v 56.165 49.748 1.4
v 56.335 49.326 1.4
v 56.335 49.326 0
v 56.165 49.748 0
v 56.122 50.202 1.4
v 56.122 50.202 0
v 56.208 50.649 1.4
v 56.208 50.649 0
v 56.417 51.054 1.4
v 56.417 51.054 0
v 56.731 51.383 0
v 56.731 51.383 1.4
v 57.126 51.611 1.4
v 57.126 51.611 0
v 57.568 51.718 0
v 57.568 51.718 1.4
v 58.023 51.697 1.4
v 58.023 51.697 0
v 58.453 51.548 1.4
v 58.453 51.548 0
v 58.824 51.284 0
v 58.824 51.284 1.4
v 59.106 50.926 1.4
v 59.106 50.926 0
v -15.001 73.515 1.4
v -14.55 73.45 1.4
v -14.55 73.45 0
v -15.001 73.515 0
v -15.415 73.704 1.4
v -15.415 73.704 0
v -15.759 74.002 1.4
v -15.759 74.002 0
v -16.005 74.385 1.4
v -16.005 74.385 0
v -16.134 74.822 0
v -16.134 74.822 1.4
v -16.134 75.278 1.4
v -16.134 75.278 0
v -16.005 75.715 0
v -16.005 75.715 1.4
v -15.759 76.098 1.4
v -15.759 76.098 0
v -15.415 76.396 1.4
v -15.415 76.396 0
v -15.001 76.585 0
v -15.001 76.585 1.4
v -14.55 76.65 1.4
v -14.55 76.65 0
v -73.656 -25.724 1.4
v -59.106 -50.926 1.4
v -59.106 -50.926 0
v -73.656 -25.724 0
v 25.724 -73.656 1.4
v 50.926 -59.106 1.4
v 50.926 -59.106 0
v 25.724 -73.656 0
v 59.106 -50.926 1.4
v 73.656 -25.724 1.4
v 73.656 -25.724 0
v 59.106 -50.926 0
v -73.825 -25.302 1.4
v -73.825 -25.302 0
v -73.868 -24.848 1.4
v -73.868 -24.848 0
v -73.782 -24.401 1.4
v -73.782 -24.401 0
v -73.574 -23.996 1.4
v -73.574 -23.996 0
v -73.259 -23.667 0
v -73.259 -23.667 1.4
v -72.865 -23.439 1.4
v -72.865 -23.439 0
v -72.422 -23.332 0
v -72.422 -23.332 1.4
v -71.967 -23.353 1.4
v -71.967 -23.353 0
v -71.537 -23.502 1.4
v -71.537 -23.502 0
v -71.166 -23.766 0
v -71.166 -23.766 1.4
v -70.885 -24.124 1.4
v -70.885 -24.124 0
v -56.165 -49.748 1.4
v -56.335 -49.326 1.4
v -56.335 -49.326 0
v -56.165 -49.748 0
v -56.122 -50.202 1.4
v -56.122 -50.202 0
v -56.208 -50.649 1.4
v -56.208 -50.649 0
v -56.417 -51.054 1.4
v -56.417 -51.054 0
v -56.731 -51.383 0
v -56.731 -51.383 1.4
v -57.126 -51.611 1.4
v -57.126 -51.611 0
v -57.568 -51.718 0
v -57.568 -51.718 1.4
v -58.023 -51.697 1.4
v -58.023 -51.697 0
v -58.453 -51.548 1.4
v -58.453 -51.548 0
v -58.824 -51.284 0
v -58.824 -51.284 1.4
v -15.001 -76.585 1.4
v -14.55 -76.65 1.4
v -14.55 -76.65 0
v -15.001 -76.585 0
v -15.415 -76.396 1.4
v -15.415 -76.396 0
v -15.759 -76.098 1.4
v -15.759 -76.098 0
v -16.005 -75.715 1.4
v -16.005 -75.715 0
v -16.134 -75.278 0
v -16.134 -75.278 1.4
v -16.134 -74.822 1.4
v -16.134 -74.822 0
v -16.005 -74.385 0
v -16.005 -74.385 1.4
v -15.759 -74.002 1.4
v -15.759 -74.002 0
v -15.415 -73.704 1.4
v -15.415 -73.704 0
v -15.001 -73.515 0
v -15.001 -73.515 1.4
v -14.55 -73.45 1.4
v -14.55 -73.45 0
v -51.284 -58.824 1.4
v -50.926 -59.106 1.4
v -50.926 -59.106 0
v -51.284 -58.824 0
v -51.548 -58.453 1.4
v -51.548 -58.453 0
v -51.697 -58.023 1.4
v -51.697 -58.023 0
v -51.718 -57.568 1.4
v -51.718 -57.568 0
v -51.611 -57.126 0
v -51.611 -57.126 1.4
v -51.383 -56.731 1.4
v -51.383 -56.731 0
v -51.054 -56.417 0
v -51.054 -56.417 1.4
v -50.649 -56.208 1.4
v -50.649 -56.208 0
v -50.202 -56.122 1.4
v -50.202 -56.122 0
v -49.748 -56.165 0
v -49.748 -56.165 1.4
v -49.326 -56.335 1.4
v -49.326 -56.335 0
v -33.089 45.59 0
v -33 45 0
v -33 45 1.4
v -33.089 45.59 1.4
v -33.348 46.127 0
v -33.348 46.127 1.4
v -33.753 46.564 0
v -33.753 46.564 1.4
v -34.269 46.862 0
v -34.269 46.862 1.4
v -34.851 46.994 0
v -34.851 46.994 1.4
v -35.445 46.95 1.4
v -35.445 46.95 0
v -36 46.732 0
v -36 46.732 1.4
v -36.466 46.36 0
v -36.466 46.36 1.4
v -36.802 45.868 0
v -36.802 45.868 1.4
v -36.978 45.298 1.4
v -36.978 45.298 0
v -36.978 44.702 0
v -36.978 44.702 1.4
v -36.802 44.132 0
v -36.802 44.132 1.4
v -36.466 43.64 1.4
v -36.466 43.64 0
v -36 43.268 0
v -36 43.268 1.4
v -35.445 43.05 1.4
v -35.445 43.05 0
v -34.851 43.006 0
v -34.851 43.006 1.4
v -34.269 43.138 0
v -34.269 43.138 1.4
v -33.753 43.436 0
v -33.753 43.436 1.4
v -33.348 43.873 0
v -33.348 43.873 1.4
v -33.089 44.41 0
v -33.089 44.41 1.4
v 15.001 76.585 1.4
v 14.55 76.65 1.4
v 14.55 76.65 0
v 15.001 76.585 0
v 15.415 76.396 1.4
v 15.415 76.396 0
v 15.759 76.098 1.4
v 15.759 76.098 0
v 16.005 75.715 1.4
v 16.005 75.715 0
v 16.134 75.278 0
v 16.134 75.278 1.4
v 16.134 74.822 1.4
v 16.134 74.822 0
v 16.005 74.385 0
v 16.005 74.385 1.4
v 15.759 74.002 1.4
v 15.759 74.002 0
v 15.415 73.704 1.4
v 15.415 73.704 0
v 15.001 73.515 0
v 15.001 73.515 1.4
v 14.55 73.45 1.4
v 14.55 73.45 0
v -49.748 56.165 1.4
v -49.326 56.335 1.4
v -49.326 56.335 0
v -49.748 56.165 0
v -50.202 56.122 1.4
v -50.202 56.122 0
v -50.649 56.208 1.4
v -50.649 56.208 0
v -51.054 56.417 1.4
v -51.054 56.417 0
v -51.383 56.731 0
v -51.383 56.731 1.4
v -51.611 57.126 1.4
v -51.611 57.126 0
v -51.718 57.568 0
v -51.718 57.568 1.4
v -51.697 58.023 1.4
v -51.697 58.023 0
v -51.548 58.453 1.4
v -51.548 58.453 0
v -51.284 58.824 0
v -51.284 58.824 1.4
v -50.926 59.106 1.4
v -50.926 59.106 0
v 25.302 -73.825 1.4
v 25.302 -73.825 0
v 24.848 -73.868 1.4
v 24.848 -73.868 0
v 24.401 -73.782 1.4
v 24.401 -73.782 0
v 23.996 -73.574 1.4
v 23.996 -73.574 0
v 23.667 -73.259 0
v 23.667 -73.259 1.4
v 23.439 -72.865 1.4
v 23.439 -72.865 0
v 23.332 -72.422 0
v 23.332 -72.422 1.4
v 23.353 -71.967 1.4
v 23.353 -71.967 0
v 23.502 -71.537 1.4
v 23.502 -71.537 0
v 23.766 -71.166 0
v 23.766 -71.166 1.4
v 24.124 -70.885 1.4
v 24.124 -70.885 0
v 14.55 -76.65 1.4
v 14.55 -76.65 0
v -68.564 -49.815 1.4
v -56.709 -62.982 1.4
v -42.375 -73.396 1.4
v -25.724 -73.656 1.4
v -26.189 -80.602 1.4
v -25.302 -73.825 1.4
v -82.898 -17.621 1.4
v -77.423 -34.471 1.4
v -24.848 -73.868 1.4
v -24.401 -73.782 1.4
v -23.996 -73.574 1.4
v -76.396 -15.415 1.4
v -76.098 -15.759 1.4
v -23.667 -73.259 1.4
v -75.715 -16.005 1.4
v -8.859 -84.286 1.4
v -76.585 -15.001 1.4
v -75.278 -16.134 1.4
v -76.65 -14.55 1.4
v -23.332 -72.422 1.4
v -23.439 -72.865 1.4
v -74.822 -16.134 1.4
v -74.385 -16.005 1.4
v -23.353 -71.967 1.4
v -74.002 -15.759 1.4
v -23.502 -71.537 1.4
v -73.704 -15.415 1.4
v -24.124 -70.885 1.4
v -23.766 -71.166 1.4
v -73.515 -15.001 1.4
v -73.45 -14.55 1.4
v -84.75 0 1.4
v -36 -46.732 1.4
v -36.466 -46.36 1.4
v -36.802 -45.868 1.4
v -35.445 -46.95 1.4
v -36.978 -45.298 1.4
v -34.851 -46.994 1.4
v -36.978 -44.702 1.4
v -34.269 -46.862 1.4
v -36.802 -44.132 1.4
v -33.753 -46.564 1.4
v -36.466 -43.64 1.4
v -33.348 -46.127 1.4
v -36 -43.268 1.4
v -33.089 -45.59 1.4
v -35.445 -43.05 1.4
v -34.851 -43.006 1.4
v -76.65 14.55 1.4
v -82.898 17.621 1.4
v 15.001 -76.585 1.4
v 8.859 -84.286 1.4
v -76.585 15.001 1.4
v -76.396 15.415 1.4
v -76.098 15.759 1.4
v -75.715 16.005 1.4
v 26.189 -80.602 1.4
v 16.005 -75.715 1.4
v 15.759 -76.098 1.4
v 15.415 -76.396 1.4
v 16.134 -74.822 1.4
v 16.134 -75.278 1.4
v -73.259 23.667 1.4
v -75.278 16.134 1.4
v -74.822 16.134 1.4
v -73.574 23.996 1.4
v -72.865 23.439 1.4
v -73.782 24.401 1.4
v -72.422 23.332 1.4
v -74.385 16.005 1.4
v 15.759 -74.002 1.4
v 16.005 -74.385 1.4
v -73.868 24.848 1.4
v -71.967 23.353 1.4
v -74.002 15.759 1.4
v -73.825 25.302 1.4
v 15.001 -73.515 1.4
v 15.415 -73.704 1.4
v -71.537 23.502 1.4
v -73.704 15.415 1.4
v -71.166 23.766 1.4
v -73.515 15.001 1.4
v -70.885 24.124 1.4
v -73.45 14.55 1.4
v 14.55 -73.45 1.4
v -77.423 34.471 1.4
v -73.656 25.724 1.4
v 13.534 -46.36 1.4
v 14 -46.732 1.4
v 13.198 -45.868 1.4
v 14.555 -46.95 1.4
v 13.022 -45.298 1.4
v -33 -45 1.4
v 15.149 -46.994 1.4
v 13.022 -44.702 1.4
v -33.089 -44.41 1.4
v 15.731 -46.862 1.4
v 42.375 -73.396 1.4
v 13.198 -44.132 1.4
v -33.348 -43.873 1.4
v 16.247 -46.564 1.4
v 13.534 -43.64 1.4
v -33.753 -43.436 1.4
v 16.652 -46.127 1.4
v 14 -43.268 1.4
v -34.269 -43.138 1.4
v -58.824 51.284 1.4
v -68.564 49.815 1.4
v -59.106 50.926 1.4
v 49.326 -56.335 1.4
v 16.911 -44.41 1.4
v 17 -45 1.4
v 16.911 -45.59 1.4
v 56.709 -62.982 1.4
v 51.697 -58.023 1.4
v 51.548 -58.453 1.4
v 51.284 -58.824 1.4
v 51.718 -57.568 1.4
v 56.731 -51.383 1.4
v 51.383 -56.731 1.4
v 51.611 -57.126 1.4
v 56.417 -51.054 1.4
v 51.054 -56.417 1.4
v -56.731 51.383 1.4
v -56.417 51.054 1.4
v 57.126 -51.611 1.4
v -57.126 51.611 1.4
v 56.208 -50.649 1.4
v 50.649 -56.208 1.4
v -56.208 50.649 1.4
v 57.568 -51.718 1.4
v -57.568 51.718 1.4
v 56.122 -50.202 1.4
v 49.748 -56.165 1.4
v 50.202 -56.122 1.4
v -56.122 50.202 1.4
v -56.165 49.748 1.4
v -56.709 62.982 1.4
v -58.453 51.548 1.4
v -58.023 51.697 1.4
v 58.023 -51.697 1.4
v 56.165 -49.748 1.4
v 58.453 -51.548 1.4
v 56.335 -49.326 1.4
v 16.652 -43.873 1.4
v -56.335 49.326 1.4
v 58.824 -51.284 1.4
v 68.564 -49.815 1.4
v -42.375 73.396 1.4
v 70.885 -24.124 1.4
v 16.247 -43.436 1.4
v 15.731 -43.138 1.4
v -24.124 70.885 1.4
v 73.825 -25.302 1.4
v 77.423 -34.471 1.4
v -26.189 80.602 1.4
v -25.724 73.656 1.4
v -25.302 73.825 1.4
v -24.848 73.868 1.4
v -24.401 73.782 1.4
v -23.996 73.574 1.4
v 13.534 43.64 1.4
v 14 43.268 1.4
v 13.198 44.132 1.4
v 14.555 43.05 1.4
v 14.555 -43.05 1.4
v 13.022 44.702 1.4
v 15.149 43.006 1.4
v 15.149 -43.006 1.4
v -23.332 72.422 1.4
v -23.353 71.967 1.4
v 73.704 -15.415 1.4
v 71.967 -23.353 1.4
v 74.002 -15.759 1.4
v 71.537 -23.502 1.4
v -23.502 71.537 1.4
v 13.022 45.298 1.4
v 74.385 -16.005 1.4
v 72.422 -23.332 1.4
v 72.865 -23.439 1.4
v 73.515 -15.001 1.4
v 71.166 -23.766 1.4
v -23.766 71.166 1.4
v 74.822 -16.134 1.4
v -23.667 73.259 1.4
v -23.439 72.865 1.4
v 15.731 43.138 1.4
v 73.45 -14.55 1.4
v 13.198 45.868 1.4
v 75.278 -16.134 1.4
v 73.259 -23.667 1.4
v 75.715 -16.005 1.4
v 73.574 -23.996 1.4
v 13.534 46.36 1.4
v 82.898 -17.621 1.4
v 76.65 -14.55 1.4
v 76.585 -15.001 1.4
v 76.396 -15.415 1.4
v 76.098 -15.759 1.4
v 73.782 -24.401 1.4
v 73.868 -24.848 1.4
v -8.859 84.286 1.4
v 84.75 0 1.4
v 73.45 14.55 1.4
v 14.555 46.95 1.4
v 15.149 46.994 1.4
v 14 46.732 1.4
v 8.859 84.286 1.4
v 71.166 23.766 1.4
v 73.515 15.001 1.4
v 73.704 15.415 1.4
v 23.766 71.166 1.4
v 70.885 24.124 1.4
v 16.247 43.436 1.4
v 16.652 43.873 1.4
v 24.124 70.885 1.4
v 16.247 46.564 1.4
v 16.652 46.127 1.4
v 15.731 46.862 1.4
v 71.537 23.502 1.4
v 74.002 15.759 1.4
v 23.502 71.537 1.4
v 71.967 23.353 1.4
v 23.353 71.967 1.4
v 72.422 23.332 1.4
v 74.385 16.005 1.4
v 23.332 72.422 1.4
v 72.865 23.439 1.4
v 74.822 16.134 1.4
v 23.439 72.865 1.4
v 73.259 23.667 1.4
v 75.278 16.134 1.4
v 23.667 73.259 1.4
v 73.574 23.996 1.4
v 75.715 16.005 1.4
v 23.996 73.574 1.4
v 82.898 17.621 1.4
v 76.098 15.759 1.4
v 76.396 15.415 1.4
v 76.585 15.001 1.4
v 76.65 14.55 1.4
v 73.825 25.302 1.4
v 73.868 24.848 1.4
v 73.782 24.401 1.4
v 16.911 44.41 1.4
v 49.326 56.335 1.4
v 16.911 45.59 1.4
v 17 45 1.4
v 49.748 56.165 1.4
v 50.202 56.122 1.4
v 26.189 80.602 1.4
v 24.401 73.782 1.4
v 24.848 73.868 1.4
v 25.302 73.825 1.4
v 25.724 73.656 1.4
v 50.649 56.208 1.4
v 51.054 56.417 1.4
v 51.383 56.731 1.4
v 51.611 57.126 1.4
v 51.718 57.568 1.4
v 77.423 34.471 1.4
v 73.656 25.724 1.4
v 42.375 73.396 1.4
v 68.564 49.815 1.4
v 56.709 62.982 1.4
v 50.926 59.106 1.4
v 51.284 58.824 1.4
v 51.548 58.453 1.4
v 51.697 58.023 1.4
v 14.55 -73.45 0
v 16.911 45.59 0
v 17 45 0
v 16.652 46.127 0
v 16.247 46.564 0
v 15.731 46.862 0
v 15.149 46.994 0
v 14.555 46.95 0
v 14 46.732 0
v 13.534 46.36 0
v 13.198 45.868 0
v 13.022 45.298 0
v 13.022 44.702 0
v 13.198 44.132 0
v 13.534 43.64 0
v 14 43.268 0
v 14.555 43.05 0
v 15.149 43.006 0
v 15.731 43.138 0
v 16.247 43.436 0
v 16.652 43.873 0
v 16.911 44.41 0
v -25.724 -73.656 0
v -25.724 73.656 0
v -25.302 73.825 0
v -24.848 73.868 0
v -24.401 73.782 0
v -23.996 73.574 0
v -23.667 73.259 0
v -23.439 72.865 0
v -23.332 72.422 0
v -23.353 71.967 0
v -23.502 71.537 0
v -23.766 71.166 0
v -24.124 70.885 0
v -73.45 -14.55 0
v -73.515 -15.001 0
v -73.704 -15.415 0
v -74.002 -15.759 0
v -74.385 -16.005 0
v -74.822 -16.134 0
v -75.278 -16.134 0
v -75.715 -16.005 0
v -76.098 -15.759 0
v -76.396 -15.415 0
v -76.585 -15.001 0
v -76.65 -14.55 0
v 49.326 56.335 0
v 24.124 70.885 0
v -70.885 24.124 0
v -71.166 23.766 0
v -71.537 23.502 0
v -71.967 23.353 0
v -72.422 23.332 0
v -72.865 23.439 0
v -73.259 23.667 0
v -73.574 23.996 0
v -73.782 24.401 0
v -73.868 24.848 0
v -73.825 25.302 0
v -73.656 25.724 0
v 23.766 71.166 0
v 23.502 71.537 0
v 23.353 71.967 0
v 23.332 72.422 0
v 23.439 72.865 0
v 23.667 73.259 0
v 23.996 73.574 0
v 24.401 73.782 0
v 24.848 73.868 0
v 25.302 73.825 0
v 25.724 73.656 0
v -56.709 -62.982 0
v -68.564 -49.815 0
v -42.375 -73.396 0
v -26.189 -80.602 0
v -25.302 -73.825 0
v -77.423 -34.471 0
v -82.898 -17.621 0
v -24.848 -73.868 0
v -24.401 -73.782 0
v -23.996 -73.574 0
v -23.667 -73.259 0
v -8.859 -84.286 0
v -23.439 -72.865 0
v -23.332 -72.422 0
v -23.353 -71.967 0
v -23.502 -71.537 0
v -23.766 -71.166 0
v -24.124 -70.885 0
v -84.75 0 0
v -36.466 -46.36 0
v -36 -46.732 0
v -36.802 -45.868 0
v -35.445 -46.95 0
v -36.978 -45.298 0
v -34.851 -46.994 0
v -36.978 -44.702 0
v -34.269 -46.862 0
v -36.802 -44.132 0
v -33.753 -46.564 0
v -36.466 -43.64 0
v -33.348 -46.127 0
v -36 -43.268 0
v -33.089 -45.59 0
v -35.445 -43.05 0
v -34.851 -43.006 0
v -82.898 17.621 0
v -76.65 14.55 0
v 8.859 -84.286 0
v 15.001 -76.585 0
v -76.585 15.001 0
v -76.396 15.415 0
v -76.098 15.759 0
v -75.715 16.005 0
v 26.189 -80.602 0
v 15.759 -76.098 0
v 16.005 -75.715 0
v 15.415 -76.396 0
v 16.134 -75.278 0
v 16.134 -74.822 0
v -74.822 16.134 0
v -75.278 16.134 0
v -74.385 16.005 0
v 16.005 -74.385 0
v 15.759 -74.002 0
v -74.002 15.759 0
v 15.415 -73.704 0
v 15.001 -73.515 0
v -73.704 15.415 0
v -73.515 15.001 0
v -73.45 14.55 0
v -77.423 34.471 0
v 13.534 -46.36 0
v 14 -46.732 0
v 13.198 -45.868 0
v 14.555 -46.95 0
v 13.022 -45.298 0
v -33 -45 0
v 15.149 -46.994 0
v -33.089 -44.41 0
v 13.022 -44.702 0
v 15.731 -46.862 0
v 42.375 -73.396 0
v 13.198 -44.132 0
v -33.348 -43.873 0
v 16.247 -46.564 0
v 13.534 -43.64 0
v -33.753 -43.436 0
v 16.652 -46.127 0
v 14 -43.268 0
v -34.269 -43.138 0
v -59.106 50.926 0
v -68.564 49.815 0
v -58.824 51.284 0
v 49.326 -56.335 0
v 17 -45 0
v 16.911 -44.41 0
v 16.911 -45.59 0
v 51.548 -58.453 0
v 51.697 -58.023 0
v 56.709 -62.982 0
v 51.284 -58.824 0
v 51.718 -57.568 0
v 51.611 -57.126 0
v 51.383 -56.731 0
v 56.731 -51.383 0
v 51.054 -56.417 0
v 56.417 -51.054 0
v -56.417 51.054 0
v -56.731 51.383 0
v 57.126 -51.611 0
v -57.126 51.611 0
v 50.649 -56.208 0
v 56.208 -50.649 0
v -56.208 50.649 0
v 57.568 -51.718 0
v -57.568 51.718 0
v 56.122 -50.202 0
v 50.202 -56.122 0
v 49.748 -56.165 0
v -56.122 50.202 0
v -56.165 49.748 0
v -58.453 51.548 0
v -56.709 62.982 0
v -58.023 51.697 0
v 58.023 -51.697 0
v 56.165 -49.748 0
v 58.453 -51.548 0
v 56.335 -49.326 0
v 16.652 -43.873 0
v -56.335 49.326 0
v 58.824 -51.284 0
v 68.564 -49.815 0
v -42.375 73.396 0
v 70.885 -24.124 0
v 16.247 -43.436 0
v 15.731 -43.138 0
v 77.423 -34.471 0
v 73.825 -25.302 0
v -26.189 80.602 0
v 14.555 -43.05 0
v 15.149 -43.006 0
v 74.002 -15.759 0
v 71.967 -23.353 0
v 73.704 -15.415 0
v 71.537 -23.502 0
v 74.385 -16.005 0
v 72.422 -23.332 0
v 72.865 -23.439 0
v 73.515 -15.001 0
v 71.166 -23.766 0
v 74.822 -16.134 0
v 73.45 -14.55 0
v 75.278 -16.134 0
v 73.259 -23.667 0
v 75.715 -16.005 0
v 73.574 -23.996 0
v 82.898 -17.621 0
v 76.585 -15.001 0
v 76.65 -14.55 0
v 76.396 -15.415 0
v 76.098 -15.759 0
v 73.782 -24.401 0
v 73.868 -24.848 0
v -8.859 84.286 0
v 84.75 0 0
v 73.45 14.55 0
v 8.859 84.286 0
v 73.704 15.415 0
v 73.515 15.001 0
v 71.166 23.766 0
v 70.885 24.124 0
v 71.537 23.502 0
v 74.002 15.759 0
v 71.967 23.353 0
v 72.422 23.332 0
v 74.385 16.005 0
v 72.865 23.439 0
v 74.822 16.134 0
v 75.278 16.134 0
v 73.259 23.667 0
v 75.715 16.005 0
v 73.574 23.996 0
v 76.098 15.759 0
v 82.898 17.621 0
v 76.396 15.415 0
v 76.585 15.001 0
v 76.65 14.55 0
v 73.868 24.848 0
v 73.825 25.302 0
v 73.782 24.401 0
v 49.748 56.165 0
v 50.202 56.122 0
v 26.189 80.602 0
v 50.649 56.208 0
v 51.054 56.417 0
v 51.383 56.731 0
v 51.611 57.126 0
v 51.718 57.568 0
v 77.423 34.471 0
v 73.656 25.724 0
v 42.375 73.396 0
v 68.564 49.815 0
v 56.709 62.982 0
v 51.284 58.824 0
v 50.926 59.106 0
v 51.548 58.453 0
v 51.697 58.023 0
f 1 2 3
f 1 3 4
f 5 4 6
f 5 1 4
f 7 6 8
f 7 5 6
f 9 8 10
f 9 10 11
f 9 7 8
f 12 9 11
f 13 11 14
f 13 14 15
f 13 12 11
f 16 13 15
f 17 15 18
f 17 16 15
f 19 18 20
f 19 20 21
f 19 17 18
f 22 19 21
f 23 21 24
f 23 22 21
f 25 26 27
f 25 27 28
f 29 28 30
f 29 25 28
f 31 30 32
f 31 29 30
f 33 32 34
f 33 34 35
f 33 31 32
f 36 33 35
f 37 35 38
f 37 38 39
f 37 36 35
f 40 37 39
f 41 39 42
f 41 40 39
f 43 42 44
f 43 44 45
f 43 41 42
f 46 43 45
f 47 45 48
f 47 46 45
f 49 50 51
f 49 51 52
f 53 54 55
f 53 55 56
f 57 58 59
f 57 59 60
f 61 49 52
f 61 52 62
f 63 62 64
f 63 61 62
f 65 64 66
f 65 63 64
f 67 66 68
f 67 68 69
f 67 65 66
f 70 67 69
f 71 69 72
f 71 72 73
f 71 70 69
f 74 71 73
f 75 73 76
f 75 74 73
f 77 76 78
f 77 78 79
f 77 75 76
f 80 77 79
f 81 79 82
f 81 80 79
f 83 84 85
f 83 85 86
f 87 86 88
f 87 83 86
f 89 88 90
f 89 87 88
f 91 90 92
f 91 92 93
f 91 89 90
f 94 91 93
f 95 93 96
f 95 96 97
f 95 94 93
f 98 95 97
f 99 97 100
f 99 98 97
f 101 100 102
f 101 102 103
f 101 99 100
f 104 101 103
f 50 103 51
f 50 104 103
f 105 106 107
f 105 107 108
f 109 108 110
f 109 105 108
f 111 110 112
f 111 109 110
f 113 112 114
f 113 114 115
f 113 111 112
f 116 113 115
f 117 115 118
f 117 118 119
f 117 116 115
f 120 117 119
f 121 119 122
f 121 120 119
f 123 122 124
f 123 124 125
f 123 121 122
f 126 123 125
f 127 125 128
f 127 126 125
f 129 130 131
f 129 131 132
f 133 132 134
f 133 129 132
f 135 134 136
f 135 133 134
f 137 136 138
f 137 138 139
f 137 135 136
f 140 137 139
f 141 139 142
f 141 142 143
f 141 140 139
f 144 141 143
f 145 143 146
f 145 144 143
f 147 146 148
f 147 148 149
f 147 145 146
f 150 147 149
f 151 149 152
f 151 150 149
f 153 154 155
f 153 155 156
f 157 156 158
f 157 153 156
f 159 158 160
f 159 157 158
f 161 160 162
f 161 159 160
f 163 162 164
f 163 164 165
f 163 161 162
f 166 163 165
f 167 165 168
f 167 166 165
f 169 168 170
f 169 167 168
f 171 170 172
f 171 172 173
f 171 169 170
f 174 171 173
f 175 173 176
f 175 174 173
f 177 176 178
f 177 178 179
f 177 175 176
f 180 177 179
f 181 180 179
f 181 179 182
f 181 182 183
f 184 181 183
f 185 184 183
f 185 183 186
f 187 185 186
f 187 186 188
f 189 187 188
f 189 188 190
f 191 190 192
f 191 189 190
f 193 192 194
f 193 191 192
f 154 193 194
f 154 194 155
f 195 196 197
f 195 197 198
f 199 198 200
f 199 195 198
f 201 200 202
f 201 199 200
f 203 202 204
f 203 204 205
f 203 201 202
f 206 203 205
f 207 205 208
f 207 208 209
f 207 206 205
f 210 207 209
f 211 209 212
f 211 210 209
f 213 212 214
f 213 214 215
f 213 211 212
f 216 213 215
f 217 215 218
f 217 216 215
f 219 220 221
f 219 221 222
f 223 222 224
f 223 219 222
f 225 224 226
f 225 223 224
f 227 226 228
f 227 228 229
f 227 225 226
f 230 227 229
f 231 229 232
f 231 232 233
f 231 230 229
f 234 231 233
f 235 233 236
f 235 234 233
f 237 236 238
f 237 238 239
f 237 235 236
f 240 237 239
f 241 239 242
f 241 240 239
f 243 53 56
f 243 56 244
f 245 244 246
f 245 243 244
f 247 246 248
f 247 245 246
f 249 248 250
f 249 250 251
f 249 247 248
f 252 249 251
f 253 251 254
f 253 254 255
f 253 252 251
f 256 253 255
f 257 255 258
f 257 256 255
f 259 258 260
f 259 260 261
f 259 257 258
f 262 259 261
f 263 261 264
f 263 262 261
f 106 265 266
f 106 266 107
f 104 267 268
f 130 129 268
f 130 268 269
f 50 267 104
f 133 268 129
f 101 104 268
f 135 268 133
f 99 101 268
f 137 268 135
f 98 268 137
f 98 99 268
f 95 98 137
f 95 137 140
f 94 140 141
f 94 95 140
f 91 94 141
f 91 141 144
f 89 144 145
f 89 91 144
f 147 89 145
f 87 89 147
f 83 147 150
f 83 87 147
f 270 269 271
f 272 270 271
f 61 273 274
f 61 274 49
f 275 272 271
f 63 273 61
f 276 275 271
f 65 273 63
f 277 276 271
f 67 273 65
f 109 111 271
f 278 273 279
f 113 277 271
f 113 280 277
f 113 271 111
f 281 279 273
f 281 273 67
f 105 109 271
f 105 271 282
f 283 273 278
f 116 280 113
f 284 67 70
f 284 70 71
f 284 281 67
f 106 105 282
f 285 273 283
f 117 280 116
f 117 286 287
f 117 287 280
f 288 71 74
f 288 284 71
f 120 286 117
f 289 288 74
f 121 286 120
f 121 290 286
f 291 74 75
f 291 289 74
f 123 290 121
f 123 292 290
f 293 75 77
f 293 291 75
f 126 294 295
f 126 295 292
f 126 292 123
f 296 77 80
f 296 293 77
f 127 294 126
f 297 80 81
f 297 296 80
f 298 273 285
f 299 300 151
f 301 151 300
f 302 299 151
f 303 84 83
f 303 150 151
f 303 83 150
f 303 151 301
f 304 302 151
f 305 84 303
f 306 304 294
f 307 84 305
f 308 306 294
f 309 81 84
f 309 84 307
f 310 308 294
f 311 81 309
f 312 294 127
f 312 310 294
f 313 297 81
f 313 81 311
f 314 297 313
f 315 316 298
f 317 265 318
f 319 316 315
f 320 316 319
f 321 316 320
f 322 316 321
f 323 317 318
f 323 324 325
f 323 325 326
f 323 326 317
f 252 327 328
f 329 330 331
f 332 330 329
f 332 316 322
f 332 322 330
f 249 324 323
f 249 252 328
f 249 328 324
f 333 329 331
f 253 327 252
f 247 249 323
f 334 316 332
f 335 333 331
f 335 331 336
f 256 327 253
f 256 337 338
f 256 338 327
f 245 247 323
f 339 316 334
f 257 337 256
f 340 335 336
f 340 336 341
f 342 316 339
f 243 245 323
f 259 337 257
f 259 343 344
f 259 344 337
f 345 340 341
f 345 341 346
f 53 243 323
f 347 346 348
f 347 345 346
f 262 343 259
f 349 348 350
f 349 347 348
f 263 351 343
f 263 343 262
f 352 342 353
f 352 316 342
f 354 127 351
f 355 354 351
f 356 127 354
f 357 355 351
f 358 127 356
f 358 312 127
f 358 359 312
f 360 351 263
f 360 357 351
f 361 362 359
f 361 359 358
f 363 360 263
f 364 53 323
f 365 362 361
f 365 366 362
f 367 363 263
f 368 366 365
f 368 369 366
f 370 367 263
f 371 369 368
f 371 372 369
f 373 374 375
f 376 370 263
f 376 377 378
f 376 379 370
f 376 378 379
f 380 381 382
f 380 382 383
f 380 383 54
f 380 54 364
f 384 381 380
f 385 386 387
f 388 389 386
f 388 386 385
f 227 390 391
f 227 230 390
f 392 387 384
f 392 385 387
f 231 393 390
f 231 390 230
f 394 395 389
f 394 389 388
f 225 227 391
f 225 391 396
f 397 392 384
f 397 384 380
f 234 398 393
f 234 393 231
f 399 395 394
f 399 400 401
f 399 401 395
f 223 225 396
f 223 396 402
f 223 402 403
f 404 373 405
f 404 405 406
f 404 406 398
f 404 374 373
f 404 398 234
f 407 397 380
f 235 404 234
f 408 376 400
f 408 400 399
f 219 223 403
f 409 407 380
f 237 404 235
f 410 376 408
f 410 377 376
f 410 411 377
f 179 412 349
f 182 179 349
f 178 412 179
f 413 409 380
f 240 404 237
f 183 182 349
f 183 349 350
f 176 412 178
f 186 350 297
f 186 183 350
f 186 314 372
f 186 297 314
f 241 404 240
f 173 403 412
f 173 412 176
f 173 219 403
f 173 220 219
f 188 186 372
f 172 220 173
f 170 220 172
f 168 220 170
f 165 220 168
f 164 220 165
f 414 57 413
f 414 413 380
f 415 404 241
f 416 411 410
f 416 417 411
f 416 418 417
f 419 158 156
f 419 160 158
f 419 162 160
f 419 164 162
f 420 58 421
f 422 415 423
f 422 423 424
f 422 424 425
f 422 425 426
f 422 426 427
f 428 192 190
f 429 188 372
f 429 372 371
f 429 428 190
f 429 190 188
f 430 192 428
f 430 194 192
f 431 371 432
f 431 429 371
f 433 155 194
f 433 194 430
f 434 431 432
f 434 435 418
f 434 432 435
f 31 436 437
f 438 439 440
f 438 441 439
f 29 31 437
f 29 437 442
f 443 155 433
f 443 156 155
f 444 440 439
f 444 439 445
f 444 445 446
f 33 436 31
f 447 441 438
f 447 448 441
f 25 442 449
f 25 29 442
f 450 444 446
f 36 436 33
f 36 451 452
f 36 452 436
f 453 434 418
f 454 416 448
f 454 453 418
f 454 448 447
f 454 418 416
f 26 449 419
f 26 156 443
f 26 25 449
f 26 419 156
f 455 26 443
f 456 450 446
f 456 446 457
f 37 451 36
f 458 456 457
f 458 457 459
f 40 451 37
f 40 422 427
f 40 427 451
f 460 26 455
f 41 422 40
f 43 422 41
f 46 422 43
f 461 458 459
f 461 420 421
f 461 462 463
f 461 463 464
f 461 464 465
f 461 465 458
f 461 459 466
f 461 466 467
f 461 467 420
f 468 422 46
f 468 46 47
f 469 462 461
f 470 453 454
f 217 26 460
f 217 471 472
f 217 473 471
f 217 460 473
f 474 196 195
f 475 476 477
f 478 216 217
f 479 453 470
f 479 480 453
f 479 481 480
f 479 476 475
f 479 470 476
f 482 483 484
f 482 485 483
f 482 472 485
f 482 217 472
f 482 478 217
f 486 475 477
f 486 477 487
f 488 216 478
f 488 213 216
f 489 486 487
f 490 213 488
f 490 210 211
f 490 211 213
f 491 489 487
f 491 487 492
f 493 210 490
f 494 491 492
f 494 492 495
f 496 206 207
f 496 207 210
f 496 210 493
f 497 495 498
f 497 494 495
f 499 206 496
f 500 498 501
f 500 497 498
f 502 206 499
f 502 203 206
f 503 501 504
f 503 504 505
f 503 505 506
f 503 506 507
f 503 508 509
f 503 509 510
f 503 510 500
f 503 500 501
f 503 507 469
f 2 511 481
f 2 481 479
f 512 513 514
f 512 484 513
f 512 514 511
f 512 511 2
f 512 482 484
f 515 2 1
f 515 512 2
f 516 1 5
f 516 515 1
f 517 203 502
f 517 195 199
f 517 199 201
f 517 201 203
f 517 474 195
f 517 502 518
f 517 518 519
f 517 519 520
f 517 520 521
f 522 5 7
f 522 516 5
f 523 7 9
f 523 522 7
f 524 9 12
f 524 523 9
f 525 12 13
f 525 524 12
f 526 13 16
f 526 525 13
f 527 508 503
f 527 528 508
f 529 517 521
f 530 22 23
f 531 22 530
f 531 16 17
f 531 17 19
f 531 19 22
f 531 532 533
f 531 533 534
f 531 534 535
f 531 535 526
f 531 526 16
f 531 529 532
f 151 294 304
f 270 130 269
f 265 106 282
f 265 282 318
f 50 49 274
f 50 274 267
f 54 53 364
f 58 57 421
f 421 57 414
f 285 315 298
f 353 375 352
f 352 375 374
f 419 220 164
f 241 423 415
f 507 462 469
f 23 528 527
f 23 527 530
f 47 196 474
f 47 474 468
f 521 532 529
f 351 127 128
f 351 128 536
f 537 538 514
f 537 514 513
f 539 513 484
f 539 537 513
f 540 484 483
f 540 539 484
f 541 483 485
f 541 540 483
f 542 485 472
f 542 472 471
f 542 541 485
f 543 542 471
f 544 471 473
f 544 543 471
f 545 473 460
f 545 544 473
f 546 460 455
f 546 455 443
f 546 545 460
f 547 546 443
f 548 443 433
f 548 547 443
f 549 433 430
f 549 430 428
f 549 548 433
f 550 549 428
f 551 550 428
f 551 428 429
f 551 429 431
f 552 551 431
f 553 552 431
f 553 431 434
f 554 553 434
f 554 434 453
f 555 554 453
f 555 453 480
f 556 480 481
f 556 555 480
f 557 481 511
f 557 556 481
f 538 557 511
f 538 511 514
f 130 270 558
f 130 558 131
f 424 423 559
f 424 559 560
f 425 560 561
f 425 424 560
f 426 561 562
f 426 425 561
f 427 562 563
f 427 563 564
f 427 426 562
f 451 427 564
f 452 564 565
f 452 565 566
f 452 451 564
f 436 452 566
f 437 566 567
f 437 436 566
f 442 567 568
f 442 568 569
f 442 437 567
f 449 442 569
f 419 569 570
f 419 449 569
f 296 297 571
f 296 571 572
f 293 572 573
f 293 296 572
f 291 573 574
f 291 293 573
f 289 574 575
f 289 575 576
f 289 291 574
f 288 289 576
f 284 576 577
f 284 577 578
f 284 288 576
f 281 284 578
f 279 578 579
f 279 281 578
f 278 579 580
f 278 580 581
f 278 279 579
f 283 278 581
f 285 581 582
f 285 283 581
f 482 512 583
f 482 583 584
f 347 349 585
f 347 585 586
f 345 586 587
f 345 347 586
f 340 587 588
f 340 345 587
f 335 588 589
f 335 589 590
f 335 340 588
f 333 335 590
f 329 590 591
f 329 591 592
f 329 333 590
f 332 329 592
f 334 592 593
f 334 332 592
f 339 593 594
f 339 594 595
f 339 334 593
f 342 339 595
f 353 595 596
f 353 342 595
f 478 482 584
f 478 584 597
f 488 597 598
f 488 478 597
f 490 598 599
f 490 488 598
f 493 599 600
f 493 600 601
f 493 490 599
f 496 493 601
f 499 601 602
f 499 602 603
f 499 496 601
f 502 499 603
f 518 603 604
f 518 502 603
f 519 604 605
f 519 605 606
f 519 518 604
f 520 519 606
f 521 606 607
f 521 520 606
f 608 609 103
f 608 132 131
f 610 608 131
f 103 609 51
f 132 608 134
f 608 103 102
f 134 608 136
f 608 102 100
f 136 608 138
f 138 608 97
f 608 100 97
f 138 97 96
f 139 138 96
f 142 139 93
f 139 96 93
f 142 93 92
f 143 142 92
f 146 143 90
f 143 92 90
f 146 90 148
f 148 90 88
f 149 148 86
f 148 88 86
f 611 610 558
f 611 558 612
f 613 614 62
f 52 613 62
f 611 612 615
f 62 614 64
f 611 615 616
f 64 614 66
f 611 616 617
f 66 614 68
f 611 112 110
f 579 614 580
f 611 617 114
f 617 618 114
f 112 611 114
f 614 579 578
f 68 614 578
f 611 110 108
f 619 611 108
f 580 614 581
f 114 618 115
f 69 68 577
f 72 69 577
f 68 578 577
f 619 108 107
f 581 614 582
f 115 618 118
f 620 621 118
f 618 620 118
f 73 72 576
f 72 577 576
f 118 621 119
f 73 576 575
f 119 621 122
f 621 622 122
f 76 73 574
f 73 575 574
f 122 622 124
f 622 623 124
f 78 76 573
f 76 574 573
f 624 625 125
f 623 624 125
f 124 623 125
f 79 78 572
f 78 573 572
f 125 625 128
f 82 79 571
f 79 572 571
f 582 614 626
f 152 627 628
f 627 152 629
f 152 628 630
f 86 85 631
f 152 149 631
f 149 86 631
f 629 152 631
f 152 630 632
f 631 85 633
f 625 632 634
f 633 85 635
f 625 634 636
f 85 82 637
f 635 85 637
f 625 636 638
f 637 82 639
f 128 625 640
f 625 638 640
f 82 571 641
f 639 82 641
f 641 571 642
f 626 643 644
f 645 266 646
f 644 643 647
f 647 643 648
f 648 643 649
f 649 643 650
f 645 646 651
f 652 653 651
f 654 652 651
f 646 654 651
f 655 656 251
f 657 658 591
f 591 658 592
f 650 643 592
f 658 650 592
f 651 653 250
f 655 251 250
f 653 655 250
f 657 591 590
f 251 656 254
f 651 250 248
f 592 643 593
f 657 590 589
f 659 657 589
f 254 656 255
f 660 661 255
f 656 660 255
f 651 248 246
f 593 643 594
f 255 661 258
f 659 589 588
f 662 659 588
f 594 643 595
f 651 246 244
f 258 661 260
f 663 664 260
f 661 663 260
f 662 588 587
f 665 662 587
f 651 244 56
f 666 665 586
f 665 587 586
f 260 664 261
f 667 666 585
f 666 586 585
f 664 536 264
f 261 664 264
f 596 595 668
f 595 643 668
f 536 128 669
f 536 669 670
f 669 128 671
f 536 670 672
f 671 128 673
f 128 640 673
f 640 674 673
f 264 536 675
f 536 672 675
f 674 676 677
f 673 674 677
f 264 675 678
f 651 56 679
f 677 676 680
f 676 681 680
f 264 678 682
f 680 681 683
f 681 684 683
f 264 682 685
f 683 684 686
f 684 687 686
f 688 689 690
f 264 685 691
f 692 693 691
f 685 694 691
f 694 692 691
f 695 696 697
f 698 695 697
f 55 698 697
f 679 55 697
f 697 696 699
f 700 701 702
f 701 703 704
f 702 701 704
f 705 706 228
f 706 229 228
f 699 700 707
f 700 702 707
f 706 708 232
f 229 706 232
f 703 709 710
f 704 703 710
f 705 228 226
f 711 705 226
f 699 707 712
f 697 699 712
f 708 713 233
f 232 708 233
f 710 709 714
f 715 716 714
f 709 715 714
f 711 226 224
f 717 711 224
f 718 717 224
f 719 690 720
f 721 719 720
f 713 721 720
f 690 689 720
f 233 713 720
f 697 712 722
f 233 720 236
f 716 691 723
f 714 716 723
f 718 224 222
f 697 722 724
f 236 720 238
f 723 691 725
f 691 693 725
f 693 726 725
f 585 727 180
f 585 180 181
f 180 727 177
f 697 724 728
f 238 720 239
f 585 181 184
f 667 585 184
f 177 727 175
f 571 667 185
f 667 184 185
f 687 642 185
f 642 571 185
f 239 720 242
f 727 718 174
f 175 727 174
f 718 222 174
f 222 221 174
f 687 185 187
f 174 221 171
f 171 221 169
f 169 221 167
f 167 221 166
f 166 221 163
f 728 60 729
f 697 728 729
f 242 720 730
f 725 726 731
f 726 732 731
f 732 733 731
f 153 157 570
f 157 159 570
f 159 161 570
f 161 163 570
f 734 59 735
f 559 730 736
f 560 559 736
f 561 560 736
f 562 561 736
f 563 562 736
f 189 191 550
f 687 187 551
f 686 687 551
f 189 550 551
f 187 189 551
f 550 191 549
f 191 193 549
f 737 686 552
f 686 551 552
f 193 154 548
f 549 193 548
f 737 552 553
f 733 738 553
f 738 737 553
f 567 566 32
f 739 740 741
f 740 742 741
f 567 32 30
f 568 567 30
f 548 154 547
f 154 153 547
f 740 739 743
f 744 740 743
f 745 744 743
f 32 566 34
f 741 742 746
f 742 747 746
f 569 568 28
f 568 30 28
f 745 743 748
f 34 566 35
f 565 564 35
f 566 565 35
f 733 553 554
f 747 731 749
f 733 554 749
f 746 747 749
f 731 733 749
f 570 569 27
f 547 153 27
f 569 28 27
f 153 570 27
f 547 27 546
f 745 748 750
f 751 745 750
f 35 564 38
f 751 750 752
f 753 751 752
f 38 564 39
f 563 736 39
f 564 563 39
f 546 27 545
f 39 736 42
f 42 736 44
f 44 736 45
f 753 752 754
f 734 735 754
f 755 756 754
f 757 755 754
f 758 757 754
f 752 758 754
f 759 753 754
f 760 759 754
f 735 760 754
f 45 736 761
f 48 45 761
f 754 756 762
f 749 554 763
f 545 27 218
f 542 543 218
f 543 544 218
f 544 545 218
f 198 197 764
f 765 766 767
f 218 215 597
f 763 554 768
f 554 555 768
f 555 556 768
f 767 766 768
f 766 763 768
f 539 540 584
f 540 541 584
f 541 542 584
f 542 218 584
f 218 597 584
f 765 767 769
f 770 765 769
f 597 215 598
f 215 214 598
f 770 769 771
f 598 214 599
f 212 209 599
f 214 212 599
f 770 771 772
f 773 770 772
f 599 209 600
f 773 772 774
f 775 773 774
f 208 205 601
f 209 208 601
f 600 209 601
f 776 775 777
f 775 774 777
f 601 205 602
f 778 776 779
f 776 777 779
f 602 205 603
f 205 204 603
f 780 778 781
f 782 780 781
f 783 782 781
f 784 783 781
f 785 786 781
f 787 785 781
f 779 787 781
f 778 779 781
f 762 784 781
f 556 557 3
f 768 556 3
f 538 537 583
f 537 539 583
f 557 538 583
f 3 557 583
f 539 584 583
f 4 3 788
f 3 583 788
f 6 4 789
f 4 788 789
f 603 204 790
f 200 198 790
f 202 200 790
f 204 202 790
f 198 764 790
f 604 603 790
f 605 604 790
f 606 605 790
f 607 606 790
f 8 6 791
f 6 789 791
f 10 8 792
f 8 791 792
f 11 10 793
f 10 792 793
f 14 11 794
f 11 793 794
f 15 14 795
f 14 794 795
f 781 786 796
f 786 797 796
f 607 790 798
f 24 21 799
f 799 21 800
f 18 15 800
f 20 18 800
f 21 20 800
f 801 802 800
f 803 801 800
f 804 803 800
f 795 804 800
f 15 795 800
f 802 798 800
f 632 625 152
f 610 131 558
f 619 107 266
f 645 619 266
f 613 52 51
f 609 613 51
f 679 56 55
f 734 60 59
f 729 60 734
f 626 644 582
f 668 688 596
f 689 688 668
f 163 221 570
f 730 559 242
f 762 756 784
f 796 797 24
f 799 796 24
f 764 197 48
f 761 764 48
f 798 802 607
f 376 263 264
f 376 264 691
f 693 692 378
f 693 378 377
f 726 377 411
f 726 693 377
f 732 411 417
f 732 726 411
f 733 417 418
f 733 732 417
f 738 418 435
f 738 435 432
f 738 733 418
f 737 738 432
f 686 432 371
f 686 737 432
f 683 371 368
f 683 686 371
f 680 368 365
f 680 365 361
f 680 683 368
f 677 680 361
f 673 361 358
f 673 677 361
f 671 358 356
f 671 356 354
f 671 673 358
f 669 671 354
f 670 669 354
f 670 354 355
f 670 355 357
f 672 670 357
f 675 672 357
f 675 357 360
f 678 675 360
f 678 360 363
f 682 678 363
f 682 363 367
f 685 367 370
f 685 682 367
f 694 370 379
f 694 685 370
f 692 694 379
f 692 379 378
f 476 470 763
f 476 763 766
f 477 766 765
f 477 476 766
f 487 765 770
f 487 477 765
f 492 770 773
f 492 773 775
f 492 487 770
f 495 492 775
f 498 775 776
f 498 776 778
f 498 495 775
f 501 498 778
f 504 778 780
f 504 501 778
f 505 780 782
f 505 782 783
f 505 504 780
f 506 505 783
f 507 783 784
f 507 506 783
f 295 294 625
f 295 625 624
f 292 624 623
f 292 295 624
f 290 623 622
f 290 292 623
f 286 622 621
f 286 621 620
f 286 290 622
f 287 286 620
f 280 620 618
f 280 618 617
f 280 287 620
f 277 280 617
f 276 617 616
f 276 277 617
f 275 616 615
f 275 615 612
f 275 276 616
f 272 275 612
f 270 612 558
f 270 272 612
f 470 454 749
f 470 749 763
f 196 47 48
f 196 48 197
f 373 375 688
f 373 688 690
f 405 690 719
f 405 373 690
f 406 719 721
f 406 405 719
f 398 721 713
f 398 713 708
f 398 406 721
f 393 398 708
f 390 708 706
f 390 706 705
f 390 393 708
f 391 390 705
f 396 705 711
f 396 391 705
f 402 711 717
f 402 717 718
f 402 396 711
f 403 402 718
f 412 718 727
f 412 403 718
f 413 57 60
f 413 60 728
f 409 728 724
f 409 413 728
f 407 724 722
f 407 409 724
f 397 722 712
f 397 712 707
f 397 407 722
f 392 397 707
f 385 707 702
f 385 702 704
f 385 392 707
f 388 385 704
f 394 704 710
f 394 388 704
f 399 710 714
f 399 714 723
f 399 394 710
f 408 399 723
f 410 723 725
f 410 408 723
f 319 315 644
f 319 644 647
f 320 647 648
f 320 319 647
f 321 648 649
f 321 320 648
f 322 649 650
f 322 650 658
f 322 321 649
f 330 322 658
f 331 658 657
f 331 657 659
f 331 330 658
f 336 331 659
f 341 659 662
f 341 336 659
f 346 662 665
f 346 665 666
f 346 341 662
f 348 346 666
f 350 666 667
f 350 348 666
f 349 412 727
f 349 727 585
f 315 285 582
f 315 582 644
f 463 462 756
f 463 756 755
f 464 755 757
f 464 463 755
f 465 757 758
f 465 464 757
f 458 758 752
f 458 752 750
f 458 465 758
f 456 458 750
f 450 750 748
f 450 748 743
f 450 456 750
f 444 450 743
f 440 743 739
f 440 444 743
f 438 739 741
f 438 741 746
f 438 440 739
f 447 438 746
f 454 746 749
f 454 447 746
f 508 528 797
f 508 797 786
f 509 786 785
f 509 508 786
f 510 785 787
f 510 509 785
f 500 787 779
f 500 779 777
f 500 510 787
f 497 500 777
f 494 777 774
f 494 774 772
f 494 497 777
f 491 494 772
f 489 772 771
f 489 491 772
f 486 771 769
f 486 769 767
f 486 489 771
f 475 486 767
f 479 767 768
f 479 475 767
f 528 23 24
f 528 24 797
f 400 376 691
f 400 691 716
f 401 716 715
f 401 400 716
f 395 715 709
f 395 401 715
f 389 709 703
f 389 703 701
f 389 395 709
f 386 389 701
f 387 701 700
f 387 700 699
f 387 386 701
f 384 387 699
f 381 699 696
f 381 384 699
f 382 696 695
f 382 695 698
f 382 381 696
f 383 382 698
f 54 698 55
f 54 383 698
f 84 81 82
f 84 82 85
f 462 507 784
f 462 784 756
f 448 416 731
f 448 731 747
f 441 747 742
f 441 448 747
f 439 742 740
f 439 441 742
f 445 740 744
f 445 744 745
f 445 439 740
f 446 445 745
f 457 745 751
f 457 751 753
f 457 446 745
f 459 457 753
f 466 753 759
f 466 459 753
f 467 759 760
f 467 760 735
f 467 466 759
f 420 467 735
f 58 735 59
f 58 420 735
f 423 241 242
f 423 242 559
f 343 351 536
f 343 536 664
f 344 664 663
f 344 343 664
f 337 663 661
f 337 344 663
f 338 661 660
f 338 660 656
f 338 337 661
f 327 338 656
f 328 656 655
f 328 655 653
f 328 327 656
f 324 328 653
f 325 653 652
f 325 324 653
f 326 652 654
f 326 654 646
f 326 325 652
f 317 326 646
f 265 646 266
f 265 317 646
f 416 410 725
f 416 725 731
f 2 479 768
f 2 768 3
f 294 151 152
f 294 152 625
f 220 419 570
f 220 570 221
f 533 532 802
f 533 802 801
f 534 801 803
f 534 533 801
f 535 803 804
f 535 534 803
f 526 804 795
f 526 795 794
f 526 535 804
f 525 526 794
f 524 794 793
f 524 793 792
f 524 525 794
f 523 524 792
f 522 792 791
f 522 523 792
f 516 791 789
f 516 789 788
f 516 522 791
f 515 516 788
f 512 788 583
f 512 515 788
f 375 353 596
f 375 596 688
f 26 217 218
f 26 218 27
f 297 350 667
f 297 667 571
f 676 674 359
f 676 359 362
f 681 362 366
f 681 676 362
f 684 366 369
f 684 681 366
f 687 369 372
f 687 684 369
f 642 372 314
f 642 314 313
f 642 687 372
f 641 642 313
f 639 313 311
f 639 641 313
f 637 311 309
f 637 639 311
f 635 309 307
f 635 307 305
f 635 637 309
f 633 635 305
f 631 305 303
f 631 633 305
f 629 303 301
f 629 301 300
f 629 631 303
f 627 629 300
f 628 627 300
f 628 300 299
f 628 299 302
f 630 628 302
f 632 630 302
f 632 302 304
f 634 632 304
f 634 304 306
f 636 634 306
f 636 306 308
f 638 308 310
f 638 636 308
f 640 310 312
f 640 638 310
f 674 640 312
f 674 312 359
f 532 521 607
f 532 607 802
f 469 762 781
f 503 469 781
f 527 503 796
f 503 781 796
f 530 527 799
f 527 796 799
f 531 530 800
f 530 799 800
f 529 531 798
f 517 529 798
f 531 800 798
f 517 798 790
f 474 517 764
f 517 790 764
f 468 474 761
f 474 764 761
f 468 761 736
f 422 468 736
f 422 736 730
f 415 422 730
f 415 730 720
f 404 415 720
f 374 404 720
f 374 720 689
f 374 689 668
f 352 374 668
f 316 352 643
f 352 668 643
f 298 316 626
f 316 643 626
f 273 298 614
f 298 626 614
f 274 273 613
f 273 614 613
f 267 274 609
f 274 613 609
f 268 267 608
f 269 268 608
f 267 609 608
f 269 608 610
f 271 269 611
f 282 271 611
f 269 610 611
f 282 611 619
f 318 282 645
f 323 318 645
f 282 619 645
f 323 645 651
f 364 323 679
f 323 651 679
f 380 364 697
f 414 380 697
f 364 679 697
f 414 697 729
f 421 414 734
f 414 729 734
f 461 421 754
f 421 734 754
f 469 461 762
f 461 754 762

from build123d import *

# Parameters (mm, degrees)
SKETCH_1_R               = 84.75
SKETCH_1_R_2             = 2
EXTRUDE_1_DEPTH          = 1.4
CUT_EXTRUDE_1_DEPTH      = 1.4
PATTERN_CIRCULAR_1_COUNT = 12


with BuildPart() as part:
    # Эскиз1 → Бобышка-Вытянуть1 (new body)
    with BuildSketch(Plane.XY):
        Circle(SKETCH_1_R)
        with Locations((15, 45)):
            Circle(SKETCH_1_R_2, mode=Mode.SUBTRACT)
        with Locations((-35, 45)):
            Circle(SKETCH_1_R_2, mode=Mode.SUBTRACT)
        with Locations((-35, -45)):
            Circle(SKETCH_1_R_2, mode=Mode.SUBTRACT)
        with Locations((15, -45)):
            Circle(SKETCH_1_R_2, mode=Mode.SUBTRACT)
    extrude(amount=EXTRUDE_1_DEPTH)

    # Эскиз2 → Вырез-Вытянуть1 (cut)
    with BuildSketch(Plane.XY.offset(1.4)):
        with BuildLine():
            Line((73.45, -14.55), (73.45, 14.55))
            ThreePointArc((73.45, 14.55), (75.05, 16.15), (76.65, 14.55))
            Line((76.65, 14.55), (76.65, -14.55))
            ThreePointArc((76.65, -14.55), (75.05, -16.15), (73.45, -14.55))
        make_face()
    cut_extrude_1 = extrude(amount=-CUT_EXTRUDE_1_DEPTH, mode=Mode.SUBTRACT)

    # Круговой массив1: Вырез-Вытянуть1 ×12 about axis
    pattern_circular_1_axis = Axis((0, 0, 0), (0, 0, 1))
    for i in range(1, PATTERN_CIRCULAR_1_COUNT):
        add(cut_extrude_1.rotate(pattern_circular_1_axis, i * 360 / PATTERN_CIRCULAR_1_COUNT), mode=Mode.SUBTRACT)


solid = part.part
